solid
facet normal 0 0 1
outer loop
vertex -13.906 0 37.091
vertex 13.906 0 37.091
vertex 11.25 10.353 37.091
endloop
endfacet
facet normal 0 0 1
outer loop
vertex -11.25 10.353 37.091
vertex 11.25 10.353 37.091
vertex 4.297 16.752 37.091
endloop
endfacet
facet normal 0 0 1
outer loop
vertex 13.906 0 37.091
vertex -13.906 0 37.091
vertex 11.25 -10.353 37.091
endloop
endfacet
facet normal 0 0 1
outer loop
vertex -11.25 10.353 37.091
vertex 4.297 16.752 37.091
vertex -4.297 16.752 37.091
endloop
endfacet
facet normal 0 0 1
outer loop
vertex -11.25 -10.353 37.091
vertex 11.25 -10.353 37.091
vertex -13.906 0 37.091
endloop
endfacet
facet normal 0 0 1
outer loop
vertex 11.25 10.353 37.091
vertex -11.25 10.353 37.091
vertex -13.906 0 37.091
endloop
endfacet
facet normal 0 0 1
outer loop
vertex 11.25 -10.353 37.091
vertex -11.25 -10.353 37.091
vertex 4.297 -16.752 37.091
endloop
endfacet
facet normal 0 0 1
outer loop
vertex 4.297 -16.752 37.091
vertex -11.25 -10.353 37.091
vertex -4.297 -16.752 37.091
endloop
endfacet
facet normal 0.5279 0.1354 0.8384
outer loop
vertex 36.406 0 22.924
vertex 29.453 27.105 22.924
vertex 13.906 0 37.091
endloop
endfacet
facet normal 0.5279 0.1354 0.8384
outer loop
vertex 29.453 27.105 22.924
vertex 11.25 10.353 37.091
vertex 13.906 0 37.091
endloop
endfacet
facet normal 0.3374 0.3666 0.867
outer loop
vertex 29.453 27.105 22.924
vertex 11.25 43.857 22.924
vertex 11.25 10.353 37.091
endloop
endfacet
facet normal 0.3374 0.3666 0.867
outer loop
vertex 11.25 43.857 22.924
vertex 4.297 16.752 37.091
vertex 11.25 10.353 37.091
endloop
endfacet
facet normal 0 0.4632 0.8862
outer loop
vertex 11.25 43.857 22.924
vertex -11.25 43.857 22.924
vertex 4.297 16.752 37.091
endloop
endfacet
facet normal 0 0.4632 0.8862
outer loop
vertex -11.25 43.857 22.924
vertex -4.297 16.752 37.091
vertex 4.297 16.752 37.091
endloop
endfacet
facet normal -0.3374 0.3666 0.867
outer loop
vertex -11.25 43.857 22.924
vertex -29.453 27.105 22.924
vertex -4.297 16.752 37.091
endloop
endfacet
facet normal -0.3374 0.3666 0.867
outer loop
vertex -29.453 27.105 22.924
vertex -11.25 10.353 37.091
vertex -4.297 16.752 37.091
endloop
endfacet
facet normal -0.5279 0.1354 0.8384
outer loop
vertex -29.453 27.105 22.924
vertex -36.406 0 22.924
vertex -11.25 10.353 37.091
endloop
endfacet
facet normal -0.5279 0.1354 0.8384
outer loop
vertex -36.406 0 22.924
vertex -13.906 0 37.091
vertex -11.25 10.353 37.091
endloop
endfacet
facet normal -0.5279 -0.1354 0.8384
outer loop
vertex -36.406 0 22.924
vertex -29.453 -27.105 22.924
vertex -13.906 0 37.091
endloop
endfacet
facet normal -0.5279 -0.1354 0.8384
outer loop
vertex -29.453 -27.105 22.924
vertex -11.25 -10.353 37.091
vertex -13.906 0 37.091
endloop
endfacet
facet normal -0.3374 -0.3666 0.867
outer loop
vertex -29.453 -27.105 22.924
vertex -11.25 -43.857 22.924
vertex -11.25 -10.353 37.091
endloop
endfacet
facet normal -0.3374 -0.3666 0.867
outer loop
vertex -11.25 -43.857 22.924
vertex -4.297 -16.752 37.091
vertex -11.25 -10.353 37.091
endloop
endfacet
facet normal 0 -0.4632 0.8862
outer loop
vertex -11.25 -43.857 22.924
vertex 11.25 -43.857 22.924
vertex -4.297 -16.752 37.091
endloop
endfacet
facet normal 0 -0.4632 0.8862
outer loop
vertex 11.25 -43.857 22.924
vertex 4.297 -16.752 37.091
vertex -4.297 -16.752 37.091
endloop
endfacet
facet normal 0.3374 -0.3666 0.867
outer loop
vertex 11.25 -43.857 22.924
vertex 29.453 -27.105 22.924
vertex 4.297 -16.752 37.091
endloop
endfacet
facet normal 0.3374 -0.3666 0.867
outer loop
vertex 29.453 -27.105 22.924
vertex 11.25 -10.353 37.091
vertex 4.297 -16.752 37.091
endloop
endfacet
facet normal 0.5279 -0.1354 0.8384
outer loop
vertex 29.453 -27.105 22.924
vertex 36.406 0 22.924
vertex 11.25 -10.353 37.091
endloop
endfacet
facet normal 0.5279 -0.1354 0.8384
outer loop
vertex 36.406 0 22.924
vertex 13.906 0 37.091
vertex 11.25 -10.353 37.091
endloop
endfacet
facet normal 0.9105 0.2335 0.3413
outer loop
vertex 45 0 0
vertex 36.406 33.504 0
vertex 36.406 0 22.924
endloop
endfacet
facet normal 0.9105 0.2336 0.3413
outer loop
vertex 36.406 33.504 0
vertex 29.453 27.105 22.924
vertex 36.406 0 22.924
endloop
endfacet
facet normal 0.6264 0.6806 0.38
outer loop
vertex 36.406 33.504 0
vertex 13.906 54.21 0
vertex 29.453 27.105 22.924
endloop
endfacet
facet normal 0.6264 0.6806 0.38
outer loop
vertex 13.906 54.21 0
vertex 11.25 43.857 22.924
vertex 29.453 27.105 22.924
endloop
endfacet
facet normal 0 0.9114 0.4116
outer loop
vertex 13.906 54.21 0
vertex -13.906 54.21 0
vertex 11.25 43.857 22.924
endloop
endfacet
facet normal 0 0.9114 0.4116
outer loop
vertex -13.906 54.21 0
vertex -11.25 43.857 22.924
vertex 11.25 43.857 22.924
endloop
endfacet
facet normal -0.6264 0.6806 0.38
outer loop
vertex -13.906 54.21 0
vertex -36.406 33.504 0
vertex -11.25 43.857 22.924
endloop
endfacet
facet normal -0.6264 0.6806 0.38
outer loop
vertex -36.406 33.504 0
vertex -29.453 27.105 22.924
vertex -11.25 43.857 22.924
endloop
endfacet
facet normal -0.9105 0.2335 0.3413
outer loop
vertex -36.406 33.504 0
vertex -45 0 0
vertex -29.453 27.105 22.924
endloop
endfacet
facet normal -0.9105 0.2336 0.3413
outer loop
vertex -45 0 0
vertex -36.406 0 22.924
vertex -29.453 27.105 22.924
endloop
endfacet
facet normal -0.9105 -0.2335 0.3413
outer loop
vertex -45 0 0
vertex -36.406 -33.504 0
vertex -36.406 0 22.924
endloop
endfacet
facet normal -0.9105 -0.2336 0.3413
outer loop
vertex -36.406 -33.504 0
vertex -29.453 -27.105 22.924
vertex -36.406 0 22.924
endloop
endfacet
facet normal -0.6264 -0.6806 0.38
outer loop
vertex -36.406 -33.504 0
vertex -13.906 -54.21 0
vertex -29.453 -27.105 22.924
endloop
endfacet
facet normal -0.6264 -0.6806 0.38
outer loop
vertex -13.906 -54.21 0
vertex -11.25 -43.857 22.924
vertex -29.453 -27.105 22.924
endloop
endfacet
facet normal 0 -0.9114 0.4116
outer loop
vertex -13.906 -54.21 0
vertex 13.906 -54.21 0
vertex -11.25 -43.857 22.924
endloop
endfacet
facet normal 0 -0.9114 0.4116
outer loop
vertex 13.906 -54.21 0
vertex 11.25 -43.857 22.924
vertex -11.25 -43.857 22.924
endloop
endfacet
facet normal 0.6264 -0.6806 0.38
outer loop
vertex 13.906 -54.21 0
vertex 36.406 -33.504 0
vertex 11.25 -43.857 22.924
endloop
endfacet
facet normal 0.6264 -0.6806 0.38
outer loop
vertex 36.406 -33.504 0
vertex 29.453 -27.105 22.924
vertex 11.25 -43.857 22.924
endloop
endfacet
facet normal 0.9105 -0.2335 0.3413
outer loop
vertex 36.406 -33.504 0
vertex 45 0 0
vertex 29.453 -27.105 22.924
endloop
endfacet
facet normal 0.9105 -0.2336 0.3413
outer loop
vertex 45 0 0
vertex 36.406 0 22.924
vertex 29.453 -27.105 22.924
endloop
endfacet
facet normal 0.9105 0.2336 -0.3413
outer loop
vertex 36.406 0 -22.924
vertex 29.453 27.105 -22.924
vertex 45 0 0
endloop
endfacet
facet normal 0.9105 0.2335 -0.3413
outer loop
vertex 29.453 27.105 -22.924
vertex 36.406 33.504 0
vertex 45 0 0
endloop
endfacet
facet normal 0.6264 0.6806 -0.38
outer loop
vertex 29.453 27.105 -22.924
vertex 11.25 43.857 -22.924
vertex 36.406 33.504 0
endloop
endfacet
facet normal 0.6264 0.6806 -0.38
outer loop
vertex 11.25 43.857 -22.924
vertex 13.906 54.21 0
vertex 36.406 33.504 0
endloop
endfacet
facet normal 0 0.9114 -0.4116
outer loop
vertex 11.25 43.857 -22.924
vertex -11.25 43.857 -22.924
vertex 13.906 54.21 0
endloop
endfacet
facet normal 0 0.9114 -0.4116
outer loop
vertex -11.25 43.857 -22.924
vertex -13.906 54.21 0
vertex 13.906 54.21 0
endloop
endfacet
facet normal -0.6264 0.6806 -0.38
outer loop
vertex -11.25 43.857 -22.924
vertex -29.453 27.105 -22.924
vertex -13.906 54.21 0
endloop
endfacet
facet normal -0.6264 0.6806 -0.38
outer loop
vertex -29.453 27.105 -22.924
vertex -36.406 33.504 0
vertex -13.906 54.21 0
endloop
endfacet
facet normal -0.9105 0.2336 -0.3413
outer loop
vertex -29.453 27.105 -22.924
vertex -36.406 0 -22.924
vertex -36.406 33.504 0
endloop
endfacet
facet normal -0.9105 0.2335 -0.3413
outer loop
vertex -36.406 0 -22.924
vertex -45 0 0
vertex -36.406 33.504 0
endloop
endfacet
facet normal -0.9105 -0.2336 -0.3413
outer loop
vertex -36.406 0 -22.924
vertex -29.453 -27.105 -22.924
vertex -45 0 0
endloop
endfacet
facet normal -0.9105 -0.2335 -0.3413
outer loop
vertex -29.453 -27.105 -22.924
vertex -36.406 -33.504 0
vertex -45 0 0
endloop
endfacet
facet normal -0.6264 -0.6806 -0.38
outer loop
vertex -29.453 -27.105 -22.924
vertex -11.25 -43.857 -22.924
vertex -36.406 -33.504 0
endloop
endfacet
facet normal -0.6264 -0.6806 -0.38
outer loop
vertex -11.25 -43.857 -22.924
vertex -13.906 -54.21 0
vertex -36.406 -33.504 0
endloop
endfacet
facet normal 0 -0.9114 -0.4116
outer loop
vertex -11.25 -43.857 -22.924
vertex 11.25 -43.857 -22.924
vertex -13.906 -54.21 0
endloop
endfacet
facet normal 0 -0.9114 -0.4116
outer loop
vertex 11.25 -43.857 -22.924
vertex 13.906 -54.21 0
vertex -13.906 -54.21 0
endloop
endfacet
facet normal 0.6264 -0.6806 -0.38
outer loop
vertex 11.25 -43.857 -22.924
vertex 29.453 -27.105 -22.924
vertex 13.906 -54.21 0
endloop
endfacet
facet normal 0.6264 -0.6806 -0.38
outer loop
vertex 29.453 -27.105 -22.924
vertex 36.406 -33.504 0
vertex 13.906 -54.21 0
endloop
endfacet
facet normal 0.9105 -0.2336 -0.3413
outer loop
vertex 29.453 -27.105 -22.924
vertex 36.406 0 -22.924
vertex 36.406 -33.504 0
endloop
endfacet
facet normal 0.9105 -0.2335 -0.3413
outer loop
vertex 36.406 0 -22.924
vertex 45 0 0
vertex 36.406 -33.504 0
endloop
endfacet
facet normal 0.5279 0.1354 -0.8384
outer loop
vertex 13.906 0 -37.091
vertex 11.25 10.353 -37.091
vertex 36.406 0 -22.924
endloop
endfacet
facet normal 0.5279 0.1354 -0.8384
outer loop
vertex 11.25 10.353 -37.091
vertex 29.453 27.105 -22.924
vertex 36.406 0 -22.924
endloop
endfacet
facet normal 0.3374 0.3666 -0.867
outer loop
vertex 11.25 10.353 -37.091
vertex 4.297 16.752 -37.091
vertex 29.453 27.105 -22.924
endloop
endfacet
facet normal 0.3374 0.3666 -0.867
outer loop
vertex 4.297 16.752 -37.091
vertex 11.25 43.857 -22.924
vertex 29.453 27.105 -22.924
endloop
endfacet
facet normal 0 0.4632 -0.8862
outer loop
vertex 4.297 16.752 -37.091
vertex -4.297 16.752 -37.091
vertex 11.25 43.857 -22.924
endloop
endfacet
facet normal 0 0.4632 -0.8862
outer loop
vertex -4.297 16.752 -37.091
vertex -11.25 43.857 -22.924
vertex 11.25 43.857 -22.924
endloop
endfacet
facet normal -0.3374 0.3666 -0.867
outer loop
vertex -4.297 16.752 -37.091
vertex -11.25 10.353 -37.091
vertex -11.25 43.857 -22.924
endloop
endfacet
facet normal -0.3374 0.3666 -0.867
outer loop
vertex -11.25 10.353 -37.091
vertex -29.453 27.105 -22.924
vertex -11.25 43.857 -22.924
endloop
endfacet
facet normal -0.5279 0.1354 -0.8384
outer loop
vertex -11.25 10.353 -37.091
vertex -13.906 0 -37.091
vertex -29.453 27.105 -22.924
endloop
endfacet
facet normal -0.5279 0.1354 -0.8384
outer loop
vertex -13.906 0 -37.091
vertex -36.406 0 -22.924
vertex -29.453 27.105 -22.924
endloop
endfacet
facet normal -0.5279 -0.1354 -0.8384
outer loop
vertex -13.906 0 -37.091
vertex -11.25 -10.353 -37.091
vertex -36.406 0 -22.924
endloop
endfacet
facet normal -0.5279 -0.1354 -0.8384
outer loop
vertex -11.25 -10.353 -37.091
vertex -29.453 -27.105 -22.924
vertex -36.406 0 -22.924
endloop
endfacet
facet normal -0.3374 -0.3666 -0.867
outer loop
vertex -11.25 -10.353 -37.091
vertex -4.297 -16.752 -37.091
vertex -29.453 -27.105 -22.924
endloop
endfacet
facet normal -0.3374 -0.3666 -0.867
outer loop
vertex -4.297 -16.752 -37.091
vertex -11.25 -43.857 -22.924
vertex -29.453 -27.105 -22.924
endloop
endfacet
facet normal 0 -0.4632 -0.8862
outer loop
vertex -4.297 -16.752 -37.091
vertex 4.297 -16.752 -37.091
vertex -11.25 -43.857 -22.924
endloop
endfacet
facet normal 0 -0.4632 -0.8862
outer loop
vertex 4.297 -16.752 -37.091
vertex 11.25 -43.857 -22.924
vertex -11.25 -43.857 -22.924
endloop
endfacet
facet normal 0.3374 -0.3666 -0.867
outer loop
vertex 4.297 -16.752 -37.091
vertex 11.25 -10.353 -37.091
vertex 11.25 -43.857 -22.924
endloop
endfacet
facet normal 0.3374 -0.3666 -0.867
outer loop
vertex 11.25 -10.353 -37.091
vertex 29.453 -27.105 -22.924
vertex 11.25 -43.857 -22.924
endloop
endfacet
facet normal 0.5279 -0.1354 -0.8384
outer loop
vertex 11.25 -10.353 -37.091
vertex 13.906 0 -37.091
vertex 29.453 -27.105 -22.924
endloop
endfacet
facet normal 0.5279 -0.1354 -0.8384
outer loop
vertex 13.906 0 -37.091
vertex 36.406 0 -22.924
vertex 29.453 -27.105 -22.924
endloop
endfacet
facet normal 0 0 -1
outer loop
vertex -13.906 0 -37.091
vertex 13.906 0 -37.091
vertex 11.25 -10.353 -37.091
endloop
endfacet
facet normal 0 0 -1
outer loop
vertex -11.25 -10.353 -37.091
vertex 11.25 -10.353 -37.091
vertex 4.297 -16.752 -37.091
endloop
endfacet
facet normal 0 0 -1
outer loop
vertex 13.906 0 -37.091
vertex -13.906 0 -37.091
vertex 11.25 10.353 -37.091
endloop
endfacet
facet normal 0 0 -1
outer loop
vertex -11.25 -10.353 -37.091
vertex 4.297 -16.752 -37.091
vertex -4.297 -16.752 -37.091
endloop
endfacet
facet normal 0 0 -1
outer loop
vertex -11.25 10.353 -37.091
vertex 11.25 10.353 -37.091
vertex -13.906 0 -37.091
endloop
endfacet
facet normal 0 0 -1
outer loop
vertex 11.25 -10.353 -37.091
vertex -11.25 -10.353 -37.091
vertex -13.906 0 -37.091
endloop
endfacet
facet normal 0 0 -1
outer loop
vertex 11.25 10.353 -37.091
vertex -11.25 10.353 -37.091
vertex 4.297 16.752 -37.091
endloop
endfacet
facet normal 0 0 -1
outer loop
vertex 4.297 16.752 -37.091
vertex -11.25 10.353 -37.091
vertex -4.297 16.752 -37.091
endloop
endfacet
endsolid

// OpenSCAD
// Generated by SolidPython 1.0.1 on 2020-07-29 00:46:52


scale(v = [15, 19, 13]) {
	sphere(r = 3);
}
/***********************************************
*********      SolidPython code:      **********
************************************************
 
# import packages: SolidPython
from solid import *
from solid.utils import *
from itertools import chain, combinations, permutations


class Resize:

    def __init__(self, scad_file):
        self.scad_file = scad_file
        #self.scad_file = import_scad(scad_file)
        # cone/cylinder param:
        self.r1 = 0
        self.r2 = 0
        self.h = 0
        # rectangular prism param:
        self.w = 0
        self.l = 0
        # ellipse param:
        self.r = 0

    # import OpenScad code (file name corresponds to shape)


    # classify shape + parameters
    def assign(self, param1, param2, param3):
        if self.scad_file == 'cone.scad':
            self.r1 = param1
            self.r2 = param2
            self.h = param3
        elif self.scad_file == 'cylinder.scad':
            self.r1 = param1
            self.r2 = param2
            self.h = param3
        elif self.scad_file == 'rectangularPrism.scad':
            self.h = param1
            self.l = param2
            self.w = param3
        else:
            self.r = param1
            self.h = param2

    # resize parameters
    def iterate(self):
        x = range(3, 20, 2)
        i = 1
        if self.scad_file == 'cone.scad':
            tempList = list(permutations(x, 2))
            for temp in tempList:
                param1 = temp[0]
                param2 = temp[1]
                filepath = 'produced_scad_files/' + 'cone' + str(param1) + '_' + str(param2) + '_' + '.scad'
                scad_render_to_file(cylinder(h=param1, r1=param2, r2=0), filepath)

        elif self.scad_file == 'cylinder.scad':
            tempList = list(permutations(x, 3))
            for temp in tempList:
                param1 = temp[0]
                param2 = temp[1]
                filepath = 'produced_scad_files/' + 'cylinder' + str(param1) + '_' + str(param2) + '_' + '.scad'
                scad_render_to_file(cylinder(h=param1, r1=param2, r2=param2), filepath)

        elif self.scad_file == 'rectangularPrism.scad':
            tempList = list(permutations(x, 3))
            for temp in tempList:
                param1 = temp[0]
                param2 = temp[1]
                param3 = temp[2]
                filepath = 'produced_scad_files/' + 'rectangularPrism' + str(param1) + '_' + str(param2) + '_' + str(
                    param3) + '.scad'
                scad_render_to_file(cube(size=(param1, param2, param3)), filepath)

        elif self.scad_file == 'ellipse.scad':
            tempList = list(permutations(x, 4))
            for temp in tempList:
                param1 = temp[0]
                param2 = temp[1]
                param3 = temp[2]
                param4 = temp[3]
                filepath = 'produced_scad_files/' + 'ellipse' + str(param1) + '_' + str(param2) + '_' + str(param3) + '_' + str(param4) + '.scad'
                scad_render_to_file(scale([param1, param2, param3])(sphere(r=param4)), filepath)

    def render_to_scadfile(self):
        scad_render_to_file(scad, 'example.scad') 
 
************************************************/
